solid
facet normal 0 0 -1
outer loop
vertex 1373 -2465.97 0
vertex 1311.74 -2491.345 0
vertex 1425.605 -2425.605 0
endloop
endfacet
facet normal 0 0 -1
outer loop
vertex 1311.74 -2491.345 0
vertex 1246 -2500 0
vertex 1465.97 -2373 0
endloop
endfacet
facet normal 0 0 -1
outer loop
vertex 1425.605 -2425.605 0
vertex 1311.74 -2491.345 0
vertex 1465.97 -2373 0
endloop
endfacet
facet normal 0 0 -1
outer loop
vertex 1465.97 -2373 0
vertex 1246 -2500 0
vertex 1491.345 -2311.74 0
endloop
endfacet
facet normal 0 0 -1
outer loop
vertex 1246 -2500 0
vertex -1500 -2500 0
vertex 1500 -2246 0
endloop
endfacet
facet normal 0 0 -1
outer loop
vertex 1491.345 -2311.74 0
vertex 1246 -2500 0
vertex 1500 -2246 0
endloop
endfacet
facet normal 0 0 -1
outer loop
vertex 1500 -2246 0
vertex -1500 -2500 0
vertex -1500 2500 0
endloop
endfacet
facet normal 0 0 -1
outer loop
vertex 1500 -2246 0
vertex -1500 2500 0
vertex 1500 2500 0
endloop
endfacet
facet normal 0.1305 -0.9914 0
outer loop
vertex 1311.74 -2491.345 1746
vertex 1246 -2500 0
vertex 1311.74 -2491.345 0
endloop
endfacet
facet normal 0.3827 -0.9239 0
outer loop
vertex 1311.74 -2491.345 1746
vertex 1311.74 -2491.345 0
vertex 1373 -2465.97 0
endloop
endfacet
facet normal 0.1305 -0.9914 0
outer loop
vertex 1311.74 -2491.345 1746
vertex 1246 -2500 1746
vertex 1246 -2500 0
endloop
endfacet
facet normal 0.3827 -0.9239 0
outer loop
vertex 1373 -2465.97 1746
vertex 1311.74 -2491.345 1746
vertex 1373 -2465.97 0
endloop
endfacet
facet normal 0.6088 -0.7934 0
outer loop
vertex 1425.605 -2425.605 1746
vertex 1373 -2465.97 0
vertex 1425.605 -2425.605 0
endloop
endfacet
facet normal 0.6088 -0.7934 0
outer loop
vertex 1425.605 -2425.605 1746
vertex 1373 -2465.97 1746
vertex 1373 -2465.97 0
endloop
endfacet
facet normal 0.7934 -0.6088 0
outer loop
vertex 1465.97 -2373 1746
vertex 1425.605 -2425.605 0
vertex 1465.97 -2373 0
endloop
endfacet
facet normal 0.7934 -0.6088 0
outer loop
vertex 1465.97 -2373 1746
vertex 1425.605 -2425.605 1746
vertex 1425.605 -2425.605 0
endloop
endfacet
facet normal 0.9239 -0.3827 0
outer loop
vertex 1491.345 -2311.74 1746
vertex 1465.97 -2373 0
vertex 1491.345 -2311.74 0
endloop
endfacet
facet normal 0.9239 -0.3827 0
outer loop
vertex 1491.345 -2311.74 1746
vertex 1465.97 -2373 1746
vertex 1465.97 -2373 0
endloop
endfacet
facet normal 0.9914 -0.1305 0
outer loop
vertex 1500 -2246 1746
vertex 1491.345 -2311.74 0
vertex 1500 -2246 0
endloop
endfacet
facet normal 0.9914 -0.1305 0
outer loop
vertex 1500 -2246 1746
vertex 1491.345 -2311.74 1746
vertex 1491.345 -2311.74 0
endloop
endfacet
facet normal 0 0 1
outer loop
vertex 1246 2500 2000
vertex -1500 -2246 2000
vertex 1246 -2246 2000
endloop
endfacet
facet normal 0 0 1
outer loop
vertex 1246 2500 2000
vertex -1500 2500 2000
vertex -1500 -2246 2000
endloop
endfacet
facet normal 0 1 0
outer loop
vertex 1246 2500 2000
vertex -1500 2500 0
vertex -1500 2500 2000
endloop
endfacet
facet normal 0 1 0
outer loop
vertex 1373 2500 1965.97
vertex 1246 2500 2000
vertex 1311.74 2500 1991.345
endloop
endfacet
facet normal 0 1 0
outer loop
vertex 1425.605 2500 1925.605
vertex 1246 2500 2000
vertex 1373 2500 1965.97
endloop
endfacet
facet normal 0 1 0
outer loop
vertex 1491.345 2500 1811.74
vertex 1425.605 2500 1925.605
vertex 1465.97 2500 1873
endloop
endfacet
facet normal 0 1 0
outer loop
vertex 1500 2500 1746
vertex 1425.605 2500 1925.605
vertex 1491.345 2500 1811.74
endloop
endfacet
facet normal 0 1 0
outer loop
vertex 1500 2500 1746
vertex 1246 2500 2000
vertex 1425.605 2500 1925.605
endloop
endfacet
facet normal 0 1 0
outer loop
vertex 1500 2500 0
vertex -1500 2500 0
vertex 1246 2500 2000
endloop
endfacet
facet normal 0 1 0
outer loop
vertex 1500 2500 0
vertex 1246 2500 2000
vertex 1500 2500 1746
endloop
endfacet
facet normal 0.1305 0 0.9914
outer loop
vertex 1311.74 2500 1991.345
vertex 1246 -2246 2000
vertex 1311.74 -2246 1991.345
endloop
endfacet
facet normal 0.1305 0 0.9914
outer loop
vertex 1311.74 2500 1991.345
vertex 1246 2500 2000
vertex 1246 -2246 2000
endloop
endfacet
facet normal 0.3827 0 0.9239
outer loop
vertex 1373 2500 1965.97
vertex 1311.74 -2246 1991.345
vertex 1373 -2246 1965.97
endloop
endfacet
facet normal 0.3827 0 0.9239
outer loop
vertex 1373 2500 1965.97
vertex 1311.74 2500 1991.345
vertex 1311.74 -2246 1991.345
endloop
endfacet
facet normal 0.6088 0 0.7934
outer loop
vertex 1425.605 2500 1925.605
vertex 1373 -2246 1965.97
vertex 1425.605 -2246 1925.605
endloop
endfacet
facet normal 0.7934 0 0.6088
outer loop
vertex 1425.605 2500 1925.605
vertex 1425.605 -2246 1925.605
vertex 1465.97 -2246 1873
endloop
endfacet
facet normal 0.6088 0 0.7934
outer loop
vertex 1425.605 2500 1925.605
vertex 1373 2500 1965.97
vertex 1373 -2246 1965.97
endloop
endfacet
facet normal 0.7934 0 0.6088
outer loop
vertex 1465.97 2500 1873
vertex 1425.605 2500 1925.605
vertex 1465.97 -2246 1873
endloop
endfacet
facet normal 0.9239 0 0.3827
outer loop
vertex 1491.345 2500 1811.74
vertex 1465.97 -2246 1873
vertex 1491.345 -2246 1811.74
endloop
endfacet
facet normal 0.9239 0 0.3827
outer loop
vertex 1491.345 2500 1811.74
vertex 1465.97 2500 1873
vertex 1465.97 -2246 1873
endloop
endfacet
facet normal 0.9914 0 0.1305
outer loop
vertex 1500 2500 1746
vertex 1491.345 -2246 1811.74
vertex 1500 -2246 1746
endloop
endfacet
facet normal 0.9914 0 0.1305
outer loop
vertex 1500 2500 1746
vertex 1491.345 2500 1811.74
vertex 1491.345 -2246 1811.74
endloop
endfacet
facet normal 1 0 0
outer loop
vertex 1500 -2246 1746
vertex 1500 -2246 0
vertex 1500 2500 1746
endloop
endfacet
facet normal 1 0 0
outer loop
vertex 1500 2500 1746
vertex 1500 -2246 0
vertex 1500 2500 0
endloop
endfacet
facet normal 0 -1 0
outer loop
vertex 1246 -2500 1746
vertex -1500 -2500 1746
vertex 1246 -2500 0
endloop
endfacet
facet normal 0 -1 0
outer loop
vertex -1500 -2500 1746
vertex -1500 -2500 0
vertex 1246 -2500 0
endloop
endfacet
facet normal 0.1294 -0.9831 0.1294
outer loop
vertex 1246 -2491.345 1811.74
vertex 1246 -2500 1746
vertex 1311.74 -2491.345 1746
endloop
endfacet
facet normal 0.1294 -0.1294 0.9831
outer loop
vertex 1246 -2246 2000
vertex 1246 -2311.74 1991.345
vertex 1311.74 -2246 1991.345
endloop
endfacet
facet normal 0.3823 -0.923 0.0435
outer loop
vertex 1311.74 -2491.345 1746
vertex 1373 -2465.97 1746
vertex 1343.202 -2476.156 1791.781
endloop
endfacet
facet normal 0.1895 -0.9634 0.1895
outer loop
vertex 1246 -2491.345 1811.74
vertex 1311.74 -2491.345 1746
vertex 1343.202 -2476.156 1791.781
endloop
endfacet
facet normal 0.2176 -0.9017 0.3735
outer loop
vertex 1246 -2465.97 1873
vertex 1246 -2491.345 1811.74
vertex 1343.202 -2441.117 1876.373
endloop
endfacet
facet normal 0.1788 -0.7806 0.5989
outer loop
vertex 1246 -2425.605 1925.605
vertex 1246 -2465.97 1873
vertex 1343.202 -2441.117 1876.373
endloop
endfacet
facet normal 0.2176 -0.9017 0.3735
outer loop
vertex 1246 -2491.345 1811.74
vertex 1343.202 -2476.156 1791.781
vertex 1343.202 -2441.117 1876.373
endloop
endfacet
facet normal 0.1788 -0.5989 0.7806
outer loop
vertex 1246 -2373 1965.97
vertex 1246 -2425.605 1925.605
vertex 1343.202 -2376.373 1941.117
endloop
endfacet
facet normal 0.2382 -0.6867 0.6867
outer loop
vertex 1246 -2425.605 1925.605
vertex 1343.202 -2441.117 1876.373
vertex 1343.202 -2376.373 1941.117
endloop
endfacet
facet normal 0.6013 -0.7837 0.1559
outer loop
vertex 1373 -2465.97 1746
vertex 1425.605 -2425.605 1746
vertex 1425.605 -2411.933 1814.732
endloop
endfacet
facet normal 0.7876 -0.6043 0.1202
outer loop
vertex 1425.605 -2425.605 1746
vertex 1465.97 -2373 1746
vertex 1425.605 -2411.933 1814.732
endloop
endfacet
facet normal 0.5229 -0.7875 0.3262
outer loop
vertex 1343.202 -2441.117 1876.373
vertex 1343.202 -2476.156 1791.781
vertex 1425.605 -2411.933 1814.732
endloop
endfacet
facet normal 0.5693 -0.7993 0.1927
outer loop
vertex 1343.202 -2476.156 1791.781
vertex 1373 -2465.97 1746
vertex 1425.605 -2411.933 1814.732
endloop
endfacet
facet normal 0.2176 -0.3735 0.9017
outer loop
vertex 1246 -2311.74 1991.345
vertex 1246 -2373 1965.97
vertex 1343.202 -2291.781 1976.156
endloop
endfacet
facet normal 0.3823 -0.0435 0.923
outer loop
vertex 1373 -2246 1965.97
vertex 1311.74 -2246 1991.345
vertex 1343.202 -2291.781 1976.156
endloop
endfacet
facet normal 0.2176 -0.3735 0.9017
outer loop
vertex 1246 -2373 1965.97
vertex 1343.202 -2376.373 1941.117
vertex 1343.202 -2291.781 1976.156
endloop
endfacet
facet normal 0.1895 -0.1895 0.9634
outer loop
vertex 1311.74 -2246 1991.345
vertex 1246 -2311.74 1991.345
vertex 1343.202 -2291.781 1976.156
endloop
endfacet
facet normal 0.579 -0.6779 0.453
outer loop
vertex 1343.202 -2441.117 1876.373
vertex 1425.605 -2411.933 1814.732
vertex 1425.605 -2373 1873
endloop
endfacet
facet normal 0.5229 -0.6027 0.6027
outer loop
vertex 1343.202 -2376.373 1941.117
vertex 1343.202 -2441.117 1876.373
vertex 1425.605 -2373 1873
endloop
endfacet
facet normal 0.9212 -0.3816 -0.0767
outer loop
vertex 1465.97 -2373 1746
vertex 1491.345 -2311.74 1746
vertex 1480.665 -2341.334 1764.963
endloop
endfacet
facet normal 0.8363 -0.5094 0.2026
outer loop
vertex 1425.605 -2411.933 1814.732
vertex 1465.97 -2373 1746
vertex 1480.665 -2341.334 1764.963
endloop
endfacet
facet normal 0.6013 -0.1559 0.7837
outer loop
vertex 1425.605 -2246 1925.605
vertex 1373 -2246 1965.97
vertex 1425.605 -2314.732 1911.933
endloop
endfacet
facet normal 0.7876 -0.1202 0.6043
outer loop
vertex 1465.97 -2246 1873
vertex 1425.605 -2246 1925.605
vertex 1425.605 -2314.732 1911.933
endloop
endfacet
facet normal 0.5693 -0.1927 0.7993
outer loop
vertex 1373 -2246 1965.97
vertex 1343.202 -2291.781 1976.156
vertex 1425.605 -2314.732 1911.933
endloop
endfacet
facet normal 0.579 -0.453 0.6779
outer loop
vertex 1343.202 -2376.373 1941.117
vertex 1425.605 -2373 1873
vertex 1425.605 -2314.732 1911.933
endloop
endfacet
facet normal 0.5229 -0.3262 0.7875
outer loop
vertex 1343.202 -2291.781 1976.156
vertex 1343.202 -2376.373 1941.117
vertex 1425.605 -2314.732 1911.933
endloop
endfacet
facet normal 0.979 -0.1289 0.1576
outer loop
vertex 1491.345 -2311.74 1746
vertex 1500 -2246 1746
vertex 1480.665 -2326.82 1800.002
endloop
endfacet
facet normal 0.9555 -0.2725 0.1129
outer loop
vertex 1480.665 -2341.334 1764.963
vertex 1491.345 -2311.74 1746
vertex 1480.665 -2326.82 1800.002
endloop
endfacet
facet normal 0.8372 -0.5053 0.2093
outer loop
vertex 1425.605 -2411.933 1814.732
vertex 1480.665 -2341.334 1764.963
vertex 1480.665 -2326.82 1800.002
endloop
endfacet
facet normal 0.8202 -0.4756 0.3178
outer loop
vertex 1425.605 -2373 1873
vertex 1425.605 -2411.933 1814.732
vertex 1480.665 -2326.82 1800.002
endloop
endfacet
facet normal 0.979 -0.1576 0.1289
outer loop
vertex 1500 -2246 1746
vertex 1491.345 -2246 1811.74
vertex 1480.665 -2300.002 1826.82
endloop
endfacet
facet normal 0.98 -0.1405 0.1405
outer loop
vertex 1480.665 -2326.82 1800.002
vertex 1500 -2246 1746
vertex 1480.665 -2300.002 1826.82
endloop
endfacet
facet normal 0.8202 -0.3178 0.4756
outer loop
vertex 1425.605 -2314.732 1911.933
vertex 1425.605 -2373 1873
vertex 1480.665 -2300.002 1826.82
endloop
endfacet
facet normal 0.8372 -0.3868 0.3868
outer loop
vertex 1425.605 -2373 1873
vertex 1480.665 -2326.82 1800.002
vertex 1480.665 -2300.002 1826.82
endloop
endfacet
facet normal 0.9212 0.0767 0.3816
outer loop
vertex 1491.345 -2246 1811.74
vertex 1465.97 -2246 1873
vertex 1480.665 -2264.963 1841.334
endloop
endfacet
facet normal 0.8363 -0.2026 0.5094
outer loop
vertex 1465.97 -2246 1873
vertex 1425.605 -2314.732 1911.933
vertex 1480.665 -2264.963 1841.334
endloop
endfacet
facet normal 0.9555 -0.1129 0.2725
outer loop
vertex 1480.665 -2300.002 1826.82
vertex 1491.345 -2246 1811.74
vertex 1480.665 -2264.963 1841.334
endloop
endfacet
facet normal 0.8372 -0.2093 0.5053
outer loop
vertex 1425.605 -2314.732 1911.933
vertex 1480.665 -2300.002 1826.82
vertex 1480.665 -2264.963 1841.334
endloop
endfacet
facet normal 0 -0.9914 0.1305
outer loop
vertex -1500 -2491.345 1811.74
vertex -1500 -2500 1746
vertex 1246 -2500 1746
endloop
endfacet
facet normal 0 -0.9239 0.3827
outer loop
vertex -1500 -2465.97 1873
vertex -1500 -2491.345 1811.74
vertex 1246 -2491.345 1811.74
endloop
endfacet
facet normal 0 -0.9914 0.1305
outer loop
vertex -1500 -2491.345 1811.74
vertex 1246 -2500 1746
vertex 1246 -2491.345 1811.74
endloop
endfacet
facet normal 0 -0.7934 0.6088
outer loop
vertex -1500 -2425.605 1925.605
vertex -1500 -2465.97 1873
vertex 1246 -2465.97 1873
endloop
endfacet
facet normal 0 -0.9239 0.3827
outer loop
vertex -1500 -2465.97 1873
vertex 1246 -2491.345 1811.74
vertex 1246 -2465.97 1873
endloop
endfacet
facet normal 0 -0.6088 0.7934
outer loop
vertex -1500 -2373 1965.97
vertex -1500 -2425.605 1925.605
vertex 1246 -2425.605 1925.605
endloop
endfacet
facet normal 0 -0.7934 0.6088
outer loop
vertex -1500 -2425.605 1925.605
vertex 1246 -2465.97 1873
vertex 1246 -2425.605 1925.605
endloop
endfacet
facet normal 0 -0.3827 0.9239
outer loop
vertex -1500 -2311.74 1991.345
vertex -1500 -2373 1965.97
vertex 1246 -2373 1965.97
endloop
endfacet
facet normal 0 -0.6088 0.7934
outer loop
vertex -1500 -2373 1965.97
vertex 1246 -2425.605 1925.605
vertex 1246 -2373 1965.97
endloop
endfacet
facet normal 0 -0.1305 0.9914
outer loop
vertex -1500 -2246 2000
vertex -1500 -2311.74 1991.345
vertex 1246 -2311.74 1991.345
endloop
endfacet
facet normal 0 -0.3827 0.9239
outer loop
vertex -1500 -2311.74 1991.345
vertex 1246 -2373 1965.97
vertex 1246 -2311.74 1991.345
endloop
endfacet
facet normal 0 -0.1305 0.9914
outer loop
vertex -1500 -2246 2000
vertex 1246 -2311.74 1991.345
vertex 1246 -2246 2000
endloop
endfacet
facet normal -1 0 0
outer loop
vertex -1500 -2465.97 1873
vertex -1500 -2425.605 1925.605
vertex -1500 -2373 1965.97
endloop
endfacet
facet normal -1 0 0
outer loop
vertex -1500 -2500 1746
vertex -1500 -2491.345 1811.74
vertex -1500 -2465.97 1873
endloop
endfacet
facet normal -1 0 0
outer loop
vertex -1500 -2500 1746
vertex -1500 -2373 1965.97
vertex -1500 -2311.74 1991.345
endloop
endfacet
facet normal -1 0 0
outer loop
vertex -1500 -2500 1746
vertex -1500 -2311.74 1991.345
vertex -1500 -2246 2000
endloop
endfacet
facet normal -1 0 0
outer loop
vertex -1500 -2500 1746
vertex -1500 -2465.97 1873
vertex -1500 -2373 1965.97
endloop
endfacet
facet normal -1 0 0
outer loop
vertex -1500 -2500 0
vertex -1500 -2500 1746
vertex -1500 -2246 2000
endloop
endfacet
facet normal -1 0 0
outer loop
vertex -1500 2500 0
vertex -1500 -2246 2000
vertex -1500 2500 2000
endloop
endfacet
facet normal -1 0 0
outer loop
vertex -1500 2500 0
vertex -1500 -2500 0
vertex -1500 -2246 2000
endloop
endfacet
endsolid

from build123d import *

# Parameters (mm, degrees)
F0_W     = 3000
F0_H     = 5000
F1_DEPTH = 2000
F2_R     = 254
F3_R     = 254


with BuildPart() as f1:
    # F0 (on Top) → F1 (new body)
    with BuildSketch(Plane.XY):
        Rectangle(F0_W, F0_H)
    extrude(amount=F1_DEPTH)

    # F2
    f2_edges = [f1.edges().sort_by_distance(p)[0] for p in [
        (0, -2500, 2000),
    ]]
    fillet(f2_edges, radius=F2_R)

    # F3
    f3_edges = [f1.edges().sort_by_distance(p)[0] for p in [
        (1500, -2500, 873),
        (1500, -2425.605122, 1925.605122),
        (1500, 127, 2000),
    ]]
    fillet(f3_edges, radius=F3_R)


solid = f1.part
